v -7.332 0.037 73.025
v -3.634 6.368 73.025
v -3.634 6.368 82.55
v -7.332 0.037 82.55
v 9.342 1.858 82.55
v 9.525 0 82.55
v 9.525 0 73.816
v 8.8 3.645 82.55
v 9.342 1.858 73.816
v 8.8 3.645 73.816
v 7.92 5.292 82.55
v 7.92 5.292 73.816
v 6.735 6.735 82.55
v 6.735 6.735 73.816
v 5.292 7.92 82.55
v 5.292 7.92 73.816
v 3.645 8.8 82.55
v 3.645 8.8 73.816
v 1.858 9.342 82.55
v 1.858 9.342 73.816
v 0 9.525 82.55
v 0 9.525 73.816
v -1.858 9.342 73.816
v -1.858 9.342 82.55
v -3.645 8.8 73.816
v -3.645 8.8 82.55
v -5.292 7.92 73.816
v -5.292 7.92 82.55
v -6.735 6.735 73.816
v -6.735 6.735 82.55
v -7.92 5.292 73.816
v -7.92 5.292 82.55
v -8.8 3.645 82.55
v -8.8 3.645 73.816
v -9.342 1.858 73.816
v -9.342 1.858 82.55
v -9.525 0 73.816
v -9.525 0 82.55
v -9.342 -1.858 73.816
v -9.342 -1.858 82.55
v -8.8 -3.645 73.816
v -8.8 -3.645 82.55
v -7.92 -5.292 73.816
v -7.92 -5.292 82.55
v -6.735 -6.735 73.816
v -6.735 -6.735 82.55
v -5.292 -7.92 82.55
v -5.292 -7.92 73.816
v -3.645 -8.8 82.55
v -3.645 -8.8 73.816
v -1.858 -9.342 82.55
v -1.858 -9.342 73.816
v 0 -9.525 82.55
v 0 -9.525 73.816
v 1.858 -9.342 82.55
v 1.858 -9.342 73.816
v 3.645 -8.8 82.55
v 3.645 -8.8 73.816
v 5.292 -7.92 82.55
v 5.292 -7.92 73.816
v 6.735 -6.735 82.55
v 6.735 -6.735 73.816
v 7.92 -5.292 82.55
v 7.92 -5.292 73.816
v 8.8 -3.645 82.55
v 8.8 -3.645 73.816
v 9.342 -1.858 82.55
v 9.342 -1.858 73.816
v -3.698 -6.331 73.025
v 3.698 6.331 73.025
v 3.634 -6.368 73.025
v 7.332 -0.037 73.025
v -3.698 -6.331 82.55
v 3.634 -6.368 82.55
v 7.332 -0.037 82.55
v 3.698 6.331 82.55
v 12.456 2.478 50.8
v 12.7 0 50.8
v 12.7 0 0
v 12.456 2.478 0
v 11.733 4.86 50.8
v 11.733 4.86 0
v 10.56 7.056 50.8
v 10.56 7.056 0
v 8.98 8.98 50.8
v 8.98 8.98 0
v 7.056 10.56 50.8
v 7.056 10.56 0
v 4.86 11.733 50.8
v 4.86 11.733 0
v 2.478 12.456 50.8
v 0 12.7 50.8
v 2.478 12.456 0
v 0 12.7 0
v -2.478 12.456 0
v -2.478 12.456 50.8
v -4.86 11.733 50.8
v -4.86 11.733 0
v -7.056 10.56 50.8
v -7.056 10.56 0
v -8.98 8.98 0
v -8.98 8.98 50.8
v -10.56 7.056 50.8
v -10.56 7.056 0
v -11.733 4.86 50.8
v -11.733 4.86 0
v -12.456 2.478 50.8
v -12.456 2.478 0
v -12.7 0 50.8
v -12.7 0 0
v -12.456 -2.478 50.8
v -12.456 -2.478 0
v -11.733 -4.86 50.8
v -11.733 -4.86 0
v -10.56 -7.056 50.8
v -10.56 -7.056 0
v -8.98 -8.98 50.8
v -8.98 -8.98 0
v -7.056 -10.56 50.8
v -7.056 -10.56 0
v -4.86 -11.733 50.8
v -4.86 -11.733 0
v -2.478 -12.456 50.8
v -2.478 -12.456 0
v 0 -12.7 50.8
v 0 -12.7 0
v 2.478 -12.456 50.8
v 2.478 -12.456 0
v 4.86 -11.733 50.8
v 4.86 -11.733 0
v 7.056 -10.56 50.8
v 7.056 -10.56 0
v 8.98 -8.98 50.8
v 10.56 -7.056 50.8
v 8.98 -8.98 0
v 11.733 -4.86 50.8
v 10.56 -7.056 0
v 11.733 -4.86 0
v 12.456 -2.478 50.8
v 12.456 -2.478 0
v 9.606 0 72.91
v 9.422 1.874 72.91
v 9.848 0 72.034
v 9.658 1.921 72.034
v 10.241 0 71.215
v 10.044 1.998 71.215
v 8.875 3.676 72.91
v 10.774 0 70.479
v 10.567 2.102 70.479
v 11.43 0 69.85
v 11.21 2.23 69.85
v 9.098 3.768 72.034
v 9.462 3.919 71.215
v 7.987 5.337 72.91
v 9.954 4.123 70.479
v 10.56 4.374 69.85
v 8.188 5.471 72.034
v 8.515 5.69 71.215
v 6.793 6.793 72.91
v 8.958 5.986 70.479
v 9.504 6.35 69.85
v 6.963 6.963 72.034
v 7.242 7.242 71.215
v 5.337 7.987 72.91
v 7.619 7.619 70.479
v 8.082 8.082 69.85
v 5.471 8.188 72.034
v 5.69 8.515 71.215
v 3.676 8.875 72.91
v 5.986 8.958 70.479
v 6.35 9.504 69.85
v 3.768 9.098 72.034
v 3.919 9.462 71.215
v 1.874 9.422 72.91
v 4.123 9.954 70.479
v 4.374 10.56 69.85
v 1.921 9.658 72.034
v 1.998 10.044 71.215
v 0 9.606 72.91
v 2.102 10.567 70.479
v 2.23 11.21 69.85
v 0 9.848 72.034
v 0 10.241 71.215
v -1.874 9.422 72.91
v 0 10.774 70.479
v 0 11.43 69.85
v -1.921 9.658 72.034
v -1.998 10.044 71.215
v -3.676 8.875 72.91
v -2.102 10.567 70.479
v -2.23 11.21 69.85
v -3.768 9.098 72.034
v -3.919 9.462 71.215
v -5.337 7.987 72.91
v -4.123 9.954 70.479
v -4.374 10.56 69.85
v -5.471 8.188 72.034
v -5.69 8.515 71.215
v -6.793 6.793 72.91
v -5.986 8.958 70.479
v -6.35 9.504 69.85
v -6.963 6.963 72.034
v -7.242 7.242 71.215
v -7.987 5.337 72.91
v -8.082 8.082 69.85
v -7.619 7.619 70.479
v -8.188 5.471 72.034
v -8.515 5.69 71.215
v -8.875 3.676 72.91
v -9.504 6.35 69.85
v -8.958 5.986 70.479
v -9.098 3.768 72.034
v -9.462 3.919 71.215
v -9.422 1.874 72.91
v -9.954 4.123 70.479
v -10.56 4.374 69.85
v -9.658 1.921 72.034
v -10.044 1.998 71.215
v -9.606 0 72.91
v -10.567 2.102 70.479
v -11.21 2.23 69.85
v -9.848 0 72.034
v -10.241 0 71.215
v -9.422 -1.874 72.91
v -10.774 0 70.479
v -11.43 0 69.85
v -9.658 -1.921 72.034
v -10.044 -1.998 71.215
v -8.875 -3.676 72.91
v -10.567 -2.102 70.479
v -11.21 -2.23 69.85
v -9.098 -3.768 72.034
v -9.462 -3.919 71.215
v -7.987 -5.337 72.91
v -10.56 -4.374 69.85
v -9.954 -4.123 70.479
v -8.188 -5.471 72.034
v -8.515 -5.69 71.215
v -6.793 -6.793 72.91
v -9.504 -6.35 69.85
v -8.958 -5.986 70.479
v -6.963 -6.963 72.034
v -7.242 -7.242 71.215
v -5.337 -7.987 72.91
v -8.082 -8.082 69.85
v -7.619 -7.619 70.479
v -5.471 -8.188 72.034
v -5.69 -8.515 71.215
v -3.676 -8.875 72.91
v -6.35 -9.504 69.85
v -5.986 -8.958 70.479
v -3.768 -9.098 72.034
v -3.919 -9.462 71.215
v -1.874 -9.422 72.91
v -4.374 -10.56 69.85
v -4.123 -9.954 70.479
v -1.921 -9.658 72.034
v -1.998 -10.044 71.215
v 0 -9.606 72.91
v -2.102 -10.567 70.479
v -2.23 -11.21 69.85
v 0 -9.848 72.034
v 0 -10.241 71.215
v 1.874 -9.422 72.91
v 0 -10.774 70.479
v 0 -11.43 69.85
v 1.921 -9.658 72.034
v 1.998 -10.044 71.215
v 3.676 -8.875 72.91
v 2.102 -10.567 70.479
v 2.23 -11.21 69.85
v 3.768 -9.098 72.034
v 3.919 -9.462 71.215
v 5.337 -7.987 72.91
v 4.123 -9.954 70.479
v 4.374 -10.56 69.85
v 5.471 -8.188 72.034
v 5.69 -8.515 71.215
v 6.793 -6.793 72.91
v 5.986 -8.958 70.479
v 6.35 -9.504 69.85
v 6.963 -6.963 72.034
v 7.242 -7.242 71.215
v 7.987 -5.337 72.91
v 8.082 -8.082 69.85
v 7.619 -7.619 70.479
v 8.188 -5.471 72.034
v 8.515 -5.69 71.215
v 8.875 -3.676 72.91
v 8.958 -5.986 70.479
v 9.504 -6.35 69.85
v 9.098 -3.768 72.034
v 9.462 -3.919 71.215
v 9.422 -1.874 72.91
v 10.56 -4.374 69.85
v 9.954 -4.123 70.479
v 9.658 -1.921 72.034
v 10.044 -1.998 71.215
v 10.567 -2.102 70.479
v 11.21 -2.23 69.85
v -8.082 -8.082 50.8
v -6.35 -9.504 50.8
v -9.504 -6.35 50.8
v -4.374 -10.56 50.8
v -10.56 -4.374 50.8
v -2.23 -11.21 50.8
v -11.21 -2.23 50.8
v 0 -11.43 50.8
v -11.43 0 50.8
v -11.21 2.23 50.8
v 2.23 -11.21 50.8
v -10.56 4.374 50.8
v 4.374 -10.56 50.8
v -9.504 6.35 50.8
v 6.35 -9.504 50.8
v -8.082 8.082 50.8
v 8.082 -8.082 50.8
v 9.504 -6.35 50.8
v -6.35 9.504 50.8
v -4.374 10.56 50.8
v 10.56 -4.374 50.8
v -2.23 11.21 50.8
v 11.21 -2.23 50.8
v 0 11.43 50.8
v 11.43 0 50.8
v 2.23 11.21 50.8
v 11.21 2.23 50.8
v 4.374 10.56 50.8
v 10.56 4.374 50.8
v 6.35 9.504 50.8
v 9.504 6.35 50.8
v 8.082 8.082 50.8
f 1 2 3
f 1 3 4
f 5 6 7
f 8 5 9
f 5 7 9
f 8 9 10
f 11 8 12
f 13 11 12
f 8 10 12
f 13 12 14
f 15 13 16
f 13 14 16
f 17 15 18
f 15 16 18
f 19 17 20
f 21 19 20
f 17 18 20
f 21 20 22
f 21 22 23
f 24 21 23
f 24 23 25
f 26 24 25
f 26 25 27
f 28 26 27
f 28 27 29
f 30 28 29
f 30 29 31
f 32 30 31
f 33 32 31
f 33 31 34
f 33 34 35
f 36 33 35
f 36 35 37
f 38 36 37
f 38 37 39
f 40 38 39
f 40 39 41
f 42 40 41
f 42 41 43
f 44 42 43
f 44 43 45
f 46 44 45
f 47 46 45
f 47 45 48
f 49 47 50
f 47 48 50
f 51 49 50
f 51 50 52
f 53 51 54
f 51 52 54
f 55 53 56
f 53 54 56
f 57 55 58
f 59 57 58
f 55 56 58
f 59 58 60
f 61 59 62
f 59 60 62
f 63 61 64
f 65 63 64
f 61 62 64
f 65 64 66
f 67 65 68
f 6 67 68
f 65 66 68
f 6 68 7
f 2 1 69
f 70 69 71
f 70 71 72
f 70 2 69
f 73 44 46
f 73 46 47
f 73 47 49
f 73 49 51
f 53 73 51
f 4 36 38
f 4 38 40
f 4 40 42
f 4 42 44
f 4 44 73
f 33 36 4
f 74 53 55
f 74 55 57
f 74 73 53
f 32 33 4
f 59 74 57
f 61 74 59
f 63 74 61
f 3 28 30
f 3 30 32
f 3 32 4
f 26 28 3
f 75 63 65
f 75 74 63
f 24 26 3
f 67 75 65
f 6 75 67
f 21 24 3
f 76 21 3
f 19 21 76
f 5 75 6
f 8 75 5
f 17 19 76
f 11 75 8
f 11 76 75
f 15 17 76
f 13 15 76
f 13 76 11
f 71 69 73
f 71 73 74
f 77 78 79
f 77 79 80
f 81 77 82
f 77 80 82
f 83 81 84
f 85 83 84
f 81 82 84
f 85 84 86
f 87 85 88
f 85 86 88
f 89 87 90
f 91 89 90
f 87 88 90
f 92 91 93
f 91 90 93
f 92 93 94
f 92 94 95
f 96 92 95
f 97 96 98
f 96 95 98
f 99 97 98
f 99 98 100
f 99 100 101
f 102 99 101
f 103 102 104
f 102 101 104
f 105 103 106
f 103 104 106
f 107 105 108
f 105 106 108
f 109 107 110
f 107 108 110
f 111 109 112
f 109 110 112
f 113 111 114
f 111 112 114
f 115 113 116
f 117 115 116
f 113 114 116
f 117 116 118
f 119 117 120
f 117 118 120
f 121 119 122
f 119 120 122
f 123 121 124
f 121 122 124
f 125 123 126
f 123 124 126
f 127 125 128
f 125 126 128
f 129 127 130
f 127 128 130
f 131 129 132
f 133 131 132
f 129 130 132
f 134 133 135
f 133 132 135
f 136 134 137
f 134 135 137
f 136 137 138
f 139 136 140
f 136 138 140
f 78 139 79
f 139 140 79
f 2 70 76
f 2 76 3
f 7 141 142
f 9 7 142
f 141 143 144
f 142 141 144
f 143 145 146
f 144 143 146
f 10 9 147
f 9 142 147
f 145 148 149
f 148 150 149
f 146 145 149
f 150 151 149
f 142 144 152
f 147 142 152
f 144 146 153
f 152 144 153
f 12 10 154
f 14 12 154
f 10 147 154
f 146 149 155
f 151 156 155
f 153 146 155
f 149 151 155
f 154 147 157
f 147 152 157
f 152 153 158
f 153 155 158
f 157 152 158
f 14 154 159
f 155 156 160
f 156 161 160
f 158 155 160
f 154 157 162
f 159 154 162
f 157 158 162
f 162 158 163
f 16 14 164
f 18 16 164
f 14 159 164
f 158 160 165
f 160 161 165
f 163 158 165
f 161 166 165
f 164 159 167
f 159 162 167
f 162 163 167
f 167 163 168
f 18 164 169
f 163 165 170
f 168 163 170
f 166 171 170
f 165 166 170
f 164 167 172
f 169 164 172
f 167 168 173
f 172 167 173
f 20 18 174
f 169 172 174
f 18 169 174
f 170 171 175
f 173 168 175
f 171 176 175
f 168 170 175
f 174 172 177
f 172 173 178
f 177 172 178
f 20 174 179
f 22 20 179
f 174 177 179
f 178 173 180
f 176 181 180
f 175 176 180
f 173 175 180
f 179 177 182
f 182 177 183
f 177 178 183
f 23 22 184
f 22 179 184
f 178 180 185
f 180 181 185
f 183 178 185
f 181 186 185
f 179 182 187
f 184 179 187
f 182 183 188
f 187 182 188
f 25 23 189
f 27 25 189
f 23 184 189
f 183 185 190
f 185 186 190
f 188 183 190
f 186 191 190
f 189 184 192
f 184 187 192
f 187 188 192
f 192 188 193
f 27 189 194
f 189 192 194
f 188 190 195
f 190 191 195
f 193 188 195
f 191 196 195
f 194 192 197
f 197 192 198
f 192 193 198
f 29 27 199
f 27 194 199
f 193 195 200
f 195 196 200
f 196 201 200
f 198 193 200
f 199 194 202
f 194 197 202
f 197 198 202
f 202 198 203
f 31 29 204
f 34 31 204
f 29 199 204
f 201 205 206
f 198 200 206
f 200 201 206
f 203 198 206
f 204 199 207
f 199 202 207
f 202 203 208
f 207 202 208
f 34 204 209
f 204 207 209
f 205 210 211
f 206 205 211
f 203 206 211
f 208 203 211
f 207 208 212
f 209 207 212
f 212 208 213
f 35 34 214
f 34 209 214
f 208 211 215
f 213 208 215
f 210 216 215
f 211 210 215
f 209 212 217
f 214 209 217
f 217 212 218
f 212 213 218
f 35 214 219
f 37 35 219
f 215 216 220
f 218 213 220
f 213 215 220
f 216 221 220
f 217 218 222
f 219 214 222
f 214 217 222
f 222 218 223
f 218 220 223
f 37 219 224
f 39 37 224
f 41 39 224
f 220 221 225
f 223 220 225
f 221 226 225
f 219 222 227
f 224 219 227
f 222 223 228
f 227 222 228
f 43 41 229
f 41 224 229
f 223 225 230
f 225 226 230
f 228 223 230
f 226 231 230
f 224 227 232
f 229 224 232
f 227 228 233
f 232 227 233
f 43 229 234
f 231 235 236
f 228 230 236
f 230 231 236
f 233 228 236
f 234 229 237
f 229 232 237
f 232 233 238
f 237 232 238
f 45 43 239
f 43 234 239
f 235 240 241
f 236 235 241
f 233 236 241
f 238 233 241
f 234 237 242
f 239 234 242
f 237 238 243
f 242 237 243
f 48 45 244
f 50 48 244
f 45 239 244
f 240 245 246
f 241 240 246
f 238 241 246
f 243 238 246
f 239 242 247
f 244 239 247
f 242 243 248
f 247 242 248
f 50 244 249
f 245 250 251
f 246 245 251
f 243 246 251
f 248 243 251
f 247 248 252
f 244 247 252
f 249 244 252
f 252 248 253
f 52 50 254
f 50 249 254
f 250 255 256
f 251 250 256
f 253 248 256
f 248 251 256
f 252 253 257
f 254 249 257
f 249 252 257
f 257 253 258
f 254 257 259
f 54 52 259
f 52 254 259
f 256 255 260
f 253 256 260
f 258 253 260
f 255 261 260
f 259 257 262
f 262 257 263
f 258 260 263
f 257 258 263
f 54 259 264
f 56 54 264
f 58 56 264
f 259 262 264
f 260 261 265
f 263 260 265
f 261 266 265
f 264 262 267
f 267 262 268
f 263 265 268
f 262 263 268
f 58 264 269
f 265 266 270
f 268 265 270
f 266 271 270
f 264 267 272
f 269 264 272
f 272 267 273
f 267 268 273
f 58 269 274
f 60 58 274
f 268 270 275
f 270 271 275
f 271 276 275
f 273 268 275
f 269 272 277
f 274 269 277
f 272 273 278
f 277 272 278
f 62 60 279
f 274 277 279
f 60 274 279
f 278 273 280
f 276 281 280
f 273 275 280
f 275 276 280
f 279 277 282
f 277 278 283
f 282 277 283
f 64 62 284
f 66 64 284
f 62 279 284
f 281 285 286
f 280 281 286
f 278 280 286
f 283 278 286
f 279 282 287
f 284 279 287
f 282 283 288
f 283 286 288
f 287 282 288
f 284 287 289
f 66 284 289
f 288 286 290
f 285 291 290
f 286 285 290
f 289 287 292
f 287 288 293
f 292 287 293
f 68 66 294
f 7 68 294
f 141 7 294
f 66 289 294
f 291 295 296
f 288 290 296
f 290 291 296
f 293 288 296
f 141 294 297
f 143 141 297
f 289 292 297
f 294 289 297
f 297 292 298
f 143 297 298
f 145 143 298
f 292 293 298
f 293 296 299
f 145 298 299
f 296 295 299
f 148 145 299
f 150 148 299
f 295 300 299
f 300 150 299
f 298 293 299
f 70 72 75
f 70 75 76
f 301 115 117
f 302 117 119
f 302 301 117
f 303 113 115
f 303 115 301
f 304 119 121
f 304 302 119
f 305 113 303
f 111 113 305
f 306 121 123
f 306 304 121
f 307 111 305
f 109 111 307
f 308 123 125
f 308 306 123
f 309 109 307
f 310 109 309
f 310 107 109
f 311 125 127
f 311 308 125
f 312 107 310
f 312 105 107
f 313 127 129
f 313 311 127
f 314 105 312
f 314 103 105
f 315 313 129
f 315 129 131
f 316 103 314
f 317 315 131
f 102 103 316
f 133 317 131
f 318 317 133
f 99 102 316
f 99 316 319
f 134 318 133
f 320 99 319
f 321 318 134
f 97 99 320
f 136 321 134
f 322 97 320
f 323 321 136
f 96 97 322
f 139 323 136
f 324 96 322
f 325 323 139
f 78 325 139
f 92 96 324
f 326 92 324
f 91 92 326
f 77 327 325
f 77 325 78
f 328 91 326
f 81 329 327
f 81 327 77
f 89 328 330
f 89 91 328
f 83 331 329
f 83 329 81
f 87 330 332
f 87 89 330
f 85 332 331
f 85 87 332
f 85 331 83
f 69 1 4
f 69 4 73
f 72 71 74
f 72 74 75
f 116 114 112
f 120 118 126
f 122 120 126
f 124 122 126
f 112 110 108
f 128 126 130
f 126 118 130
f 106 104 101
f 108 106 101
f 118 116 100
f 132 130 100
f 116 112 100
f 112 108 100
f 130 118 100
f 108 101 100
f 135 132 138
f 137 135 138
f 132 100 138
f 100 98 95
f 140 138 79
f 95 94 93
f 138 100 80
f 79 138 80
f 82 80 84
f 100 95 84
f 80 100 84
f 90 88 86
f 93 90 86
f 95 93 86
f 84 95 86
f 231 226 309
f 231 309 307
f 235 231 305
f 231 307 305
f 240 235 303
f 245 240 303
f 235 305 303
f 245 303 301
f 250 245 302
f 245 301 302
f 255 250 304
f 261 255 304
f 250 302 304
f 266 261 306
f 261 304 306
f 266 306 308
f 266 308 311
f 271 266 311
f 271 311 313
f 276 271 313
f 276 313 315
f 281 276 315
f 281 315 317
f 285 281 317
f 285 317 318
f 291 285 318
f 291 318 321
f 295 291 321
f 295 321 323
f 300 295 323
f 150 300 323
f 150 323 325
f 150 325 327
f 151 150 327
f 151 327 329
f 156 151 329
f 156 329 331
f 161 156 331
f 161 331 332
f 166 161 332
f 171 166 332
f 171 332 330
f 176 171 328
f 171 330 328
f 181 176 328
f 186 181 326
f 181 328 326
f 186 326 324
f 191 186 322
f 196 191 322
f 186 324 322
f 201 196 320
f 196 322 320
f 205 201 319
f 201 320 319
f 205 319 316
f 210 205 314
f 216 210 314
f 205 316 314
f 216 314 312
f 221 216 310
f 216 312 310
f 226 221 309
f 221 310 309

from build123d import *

# Parameters (mm, degrees)
SKETCH1_R           = 12.7
BOSS_EXTRUDE1_DEPTH = 50.8
SKETCH2_R           = 11.43
BOSS_EXTRUDE2_DEPTH = 19.05
SKETCH4_R           = 9.525
BOSS_EXTRUDE3_DEPTH = 12.7
FILLET1_R           = 5.08
CUT_EXTRUDE1_DEPTH  = 9.525


with BuildPart() as part:
    # Sketch1 → Boss-Extrude1 (new body)
    with BuildSketch(Plane.XY):
        Circle(SKETCH1_R)
    extrude(amount=BOSS_EXTRUDE1_DEPTH)

    # Sketch2 → Boss-Extrude2 (add)
    with BuildSketch(Plane.XY.offset(50.8)):
        with Locations(Location((0, 0, 0), (0, 0, 180))):
            Circle(SKETCH2_R)
    extrude(amount=BOSS_EXTRUDE2_DEPTH)

    # Sketch4 → Boss-Extrude3 (add)
    with BuildSketch(Plane.XY.offset(69.85)):
        Circle(SKETCH4_R)
    extrude(amount=BOSS_EXTRUDE3_DEPTH)

    # Fillet1
    # the kernel refuses this fillet: 5.08 mm, written as the material it adds along each edge
    with BuildSketch(Plane(origin=(0, 0, 69.85), x_dir=(1, 0, 0), z_dir=(0, -1, 0))) as fillet1_piece_1:
        with BuildLine():
            CenterArc((14.605, 3.965573729), FILLET1_R, 180, 51.317812547)
            Line((9.525, 3.965573729), (9.4234, 3.965573729))
            Line((9.4234, 3.965573729), (9.4234, 0))
            Line((9.4234, 0), (9.525, -0.1016))
            ThreePointArc((9.525, -0.1016), (10.4775, -0.1016), (11.3665, -0.079311475))
            Line((11.3665, -0.079311475), (11.43, 0))
        make_face()
    revolve(axis=Axis((0, 0, 69.85), (0, 0, 1)))

    # Sketch5 → Cut-Extrude1 (cut)
    with BuildSketch(Plane.XY.offset(82.55)):
        Polygon((3.698041146, 6.33149469), (-3.634214672, 6.368344922), (-7.332255819, 0.036850232), (-3.698041146, -6.33149469), (3.634214672, -6.368344922), (7.332255819, -0.036850232), align=None)
    extrude(amount=-CUT_EXTRUDE1_DEPTH, mode=Mode.SUBTRACT)


solid = part.part
